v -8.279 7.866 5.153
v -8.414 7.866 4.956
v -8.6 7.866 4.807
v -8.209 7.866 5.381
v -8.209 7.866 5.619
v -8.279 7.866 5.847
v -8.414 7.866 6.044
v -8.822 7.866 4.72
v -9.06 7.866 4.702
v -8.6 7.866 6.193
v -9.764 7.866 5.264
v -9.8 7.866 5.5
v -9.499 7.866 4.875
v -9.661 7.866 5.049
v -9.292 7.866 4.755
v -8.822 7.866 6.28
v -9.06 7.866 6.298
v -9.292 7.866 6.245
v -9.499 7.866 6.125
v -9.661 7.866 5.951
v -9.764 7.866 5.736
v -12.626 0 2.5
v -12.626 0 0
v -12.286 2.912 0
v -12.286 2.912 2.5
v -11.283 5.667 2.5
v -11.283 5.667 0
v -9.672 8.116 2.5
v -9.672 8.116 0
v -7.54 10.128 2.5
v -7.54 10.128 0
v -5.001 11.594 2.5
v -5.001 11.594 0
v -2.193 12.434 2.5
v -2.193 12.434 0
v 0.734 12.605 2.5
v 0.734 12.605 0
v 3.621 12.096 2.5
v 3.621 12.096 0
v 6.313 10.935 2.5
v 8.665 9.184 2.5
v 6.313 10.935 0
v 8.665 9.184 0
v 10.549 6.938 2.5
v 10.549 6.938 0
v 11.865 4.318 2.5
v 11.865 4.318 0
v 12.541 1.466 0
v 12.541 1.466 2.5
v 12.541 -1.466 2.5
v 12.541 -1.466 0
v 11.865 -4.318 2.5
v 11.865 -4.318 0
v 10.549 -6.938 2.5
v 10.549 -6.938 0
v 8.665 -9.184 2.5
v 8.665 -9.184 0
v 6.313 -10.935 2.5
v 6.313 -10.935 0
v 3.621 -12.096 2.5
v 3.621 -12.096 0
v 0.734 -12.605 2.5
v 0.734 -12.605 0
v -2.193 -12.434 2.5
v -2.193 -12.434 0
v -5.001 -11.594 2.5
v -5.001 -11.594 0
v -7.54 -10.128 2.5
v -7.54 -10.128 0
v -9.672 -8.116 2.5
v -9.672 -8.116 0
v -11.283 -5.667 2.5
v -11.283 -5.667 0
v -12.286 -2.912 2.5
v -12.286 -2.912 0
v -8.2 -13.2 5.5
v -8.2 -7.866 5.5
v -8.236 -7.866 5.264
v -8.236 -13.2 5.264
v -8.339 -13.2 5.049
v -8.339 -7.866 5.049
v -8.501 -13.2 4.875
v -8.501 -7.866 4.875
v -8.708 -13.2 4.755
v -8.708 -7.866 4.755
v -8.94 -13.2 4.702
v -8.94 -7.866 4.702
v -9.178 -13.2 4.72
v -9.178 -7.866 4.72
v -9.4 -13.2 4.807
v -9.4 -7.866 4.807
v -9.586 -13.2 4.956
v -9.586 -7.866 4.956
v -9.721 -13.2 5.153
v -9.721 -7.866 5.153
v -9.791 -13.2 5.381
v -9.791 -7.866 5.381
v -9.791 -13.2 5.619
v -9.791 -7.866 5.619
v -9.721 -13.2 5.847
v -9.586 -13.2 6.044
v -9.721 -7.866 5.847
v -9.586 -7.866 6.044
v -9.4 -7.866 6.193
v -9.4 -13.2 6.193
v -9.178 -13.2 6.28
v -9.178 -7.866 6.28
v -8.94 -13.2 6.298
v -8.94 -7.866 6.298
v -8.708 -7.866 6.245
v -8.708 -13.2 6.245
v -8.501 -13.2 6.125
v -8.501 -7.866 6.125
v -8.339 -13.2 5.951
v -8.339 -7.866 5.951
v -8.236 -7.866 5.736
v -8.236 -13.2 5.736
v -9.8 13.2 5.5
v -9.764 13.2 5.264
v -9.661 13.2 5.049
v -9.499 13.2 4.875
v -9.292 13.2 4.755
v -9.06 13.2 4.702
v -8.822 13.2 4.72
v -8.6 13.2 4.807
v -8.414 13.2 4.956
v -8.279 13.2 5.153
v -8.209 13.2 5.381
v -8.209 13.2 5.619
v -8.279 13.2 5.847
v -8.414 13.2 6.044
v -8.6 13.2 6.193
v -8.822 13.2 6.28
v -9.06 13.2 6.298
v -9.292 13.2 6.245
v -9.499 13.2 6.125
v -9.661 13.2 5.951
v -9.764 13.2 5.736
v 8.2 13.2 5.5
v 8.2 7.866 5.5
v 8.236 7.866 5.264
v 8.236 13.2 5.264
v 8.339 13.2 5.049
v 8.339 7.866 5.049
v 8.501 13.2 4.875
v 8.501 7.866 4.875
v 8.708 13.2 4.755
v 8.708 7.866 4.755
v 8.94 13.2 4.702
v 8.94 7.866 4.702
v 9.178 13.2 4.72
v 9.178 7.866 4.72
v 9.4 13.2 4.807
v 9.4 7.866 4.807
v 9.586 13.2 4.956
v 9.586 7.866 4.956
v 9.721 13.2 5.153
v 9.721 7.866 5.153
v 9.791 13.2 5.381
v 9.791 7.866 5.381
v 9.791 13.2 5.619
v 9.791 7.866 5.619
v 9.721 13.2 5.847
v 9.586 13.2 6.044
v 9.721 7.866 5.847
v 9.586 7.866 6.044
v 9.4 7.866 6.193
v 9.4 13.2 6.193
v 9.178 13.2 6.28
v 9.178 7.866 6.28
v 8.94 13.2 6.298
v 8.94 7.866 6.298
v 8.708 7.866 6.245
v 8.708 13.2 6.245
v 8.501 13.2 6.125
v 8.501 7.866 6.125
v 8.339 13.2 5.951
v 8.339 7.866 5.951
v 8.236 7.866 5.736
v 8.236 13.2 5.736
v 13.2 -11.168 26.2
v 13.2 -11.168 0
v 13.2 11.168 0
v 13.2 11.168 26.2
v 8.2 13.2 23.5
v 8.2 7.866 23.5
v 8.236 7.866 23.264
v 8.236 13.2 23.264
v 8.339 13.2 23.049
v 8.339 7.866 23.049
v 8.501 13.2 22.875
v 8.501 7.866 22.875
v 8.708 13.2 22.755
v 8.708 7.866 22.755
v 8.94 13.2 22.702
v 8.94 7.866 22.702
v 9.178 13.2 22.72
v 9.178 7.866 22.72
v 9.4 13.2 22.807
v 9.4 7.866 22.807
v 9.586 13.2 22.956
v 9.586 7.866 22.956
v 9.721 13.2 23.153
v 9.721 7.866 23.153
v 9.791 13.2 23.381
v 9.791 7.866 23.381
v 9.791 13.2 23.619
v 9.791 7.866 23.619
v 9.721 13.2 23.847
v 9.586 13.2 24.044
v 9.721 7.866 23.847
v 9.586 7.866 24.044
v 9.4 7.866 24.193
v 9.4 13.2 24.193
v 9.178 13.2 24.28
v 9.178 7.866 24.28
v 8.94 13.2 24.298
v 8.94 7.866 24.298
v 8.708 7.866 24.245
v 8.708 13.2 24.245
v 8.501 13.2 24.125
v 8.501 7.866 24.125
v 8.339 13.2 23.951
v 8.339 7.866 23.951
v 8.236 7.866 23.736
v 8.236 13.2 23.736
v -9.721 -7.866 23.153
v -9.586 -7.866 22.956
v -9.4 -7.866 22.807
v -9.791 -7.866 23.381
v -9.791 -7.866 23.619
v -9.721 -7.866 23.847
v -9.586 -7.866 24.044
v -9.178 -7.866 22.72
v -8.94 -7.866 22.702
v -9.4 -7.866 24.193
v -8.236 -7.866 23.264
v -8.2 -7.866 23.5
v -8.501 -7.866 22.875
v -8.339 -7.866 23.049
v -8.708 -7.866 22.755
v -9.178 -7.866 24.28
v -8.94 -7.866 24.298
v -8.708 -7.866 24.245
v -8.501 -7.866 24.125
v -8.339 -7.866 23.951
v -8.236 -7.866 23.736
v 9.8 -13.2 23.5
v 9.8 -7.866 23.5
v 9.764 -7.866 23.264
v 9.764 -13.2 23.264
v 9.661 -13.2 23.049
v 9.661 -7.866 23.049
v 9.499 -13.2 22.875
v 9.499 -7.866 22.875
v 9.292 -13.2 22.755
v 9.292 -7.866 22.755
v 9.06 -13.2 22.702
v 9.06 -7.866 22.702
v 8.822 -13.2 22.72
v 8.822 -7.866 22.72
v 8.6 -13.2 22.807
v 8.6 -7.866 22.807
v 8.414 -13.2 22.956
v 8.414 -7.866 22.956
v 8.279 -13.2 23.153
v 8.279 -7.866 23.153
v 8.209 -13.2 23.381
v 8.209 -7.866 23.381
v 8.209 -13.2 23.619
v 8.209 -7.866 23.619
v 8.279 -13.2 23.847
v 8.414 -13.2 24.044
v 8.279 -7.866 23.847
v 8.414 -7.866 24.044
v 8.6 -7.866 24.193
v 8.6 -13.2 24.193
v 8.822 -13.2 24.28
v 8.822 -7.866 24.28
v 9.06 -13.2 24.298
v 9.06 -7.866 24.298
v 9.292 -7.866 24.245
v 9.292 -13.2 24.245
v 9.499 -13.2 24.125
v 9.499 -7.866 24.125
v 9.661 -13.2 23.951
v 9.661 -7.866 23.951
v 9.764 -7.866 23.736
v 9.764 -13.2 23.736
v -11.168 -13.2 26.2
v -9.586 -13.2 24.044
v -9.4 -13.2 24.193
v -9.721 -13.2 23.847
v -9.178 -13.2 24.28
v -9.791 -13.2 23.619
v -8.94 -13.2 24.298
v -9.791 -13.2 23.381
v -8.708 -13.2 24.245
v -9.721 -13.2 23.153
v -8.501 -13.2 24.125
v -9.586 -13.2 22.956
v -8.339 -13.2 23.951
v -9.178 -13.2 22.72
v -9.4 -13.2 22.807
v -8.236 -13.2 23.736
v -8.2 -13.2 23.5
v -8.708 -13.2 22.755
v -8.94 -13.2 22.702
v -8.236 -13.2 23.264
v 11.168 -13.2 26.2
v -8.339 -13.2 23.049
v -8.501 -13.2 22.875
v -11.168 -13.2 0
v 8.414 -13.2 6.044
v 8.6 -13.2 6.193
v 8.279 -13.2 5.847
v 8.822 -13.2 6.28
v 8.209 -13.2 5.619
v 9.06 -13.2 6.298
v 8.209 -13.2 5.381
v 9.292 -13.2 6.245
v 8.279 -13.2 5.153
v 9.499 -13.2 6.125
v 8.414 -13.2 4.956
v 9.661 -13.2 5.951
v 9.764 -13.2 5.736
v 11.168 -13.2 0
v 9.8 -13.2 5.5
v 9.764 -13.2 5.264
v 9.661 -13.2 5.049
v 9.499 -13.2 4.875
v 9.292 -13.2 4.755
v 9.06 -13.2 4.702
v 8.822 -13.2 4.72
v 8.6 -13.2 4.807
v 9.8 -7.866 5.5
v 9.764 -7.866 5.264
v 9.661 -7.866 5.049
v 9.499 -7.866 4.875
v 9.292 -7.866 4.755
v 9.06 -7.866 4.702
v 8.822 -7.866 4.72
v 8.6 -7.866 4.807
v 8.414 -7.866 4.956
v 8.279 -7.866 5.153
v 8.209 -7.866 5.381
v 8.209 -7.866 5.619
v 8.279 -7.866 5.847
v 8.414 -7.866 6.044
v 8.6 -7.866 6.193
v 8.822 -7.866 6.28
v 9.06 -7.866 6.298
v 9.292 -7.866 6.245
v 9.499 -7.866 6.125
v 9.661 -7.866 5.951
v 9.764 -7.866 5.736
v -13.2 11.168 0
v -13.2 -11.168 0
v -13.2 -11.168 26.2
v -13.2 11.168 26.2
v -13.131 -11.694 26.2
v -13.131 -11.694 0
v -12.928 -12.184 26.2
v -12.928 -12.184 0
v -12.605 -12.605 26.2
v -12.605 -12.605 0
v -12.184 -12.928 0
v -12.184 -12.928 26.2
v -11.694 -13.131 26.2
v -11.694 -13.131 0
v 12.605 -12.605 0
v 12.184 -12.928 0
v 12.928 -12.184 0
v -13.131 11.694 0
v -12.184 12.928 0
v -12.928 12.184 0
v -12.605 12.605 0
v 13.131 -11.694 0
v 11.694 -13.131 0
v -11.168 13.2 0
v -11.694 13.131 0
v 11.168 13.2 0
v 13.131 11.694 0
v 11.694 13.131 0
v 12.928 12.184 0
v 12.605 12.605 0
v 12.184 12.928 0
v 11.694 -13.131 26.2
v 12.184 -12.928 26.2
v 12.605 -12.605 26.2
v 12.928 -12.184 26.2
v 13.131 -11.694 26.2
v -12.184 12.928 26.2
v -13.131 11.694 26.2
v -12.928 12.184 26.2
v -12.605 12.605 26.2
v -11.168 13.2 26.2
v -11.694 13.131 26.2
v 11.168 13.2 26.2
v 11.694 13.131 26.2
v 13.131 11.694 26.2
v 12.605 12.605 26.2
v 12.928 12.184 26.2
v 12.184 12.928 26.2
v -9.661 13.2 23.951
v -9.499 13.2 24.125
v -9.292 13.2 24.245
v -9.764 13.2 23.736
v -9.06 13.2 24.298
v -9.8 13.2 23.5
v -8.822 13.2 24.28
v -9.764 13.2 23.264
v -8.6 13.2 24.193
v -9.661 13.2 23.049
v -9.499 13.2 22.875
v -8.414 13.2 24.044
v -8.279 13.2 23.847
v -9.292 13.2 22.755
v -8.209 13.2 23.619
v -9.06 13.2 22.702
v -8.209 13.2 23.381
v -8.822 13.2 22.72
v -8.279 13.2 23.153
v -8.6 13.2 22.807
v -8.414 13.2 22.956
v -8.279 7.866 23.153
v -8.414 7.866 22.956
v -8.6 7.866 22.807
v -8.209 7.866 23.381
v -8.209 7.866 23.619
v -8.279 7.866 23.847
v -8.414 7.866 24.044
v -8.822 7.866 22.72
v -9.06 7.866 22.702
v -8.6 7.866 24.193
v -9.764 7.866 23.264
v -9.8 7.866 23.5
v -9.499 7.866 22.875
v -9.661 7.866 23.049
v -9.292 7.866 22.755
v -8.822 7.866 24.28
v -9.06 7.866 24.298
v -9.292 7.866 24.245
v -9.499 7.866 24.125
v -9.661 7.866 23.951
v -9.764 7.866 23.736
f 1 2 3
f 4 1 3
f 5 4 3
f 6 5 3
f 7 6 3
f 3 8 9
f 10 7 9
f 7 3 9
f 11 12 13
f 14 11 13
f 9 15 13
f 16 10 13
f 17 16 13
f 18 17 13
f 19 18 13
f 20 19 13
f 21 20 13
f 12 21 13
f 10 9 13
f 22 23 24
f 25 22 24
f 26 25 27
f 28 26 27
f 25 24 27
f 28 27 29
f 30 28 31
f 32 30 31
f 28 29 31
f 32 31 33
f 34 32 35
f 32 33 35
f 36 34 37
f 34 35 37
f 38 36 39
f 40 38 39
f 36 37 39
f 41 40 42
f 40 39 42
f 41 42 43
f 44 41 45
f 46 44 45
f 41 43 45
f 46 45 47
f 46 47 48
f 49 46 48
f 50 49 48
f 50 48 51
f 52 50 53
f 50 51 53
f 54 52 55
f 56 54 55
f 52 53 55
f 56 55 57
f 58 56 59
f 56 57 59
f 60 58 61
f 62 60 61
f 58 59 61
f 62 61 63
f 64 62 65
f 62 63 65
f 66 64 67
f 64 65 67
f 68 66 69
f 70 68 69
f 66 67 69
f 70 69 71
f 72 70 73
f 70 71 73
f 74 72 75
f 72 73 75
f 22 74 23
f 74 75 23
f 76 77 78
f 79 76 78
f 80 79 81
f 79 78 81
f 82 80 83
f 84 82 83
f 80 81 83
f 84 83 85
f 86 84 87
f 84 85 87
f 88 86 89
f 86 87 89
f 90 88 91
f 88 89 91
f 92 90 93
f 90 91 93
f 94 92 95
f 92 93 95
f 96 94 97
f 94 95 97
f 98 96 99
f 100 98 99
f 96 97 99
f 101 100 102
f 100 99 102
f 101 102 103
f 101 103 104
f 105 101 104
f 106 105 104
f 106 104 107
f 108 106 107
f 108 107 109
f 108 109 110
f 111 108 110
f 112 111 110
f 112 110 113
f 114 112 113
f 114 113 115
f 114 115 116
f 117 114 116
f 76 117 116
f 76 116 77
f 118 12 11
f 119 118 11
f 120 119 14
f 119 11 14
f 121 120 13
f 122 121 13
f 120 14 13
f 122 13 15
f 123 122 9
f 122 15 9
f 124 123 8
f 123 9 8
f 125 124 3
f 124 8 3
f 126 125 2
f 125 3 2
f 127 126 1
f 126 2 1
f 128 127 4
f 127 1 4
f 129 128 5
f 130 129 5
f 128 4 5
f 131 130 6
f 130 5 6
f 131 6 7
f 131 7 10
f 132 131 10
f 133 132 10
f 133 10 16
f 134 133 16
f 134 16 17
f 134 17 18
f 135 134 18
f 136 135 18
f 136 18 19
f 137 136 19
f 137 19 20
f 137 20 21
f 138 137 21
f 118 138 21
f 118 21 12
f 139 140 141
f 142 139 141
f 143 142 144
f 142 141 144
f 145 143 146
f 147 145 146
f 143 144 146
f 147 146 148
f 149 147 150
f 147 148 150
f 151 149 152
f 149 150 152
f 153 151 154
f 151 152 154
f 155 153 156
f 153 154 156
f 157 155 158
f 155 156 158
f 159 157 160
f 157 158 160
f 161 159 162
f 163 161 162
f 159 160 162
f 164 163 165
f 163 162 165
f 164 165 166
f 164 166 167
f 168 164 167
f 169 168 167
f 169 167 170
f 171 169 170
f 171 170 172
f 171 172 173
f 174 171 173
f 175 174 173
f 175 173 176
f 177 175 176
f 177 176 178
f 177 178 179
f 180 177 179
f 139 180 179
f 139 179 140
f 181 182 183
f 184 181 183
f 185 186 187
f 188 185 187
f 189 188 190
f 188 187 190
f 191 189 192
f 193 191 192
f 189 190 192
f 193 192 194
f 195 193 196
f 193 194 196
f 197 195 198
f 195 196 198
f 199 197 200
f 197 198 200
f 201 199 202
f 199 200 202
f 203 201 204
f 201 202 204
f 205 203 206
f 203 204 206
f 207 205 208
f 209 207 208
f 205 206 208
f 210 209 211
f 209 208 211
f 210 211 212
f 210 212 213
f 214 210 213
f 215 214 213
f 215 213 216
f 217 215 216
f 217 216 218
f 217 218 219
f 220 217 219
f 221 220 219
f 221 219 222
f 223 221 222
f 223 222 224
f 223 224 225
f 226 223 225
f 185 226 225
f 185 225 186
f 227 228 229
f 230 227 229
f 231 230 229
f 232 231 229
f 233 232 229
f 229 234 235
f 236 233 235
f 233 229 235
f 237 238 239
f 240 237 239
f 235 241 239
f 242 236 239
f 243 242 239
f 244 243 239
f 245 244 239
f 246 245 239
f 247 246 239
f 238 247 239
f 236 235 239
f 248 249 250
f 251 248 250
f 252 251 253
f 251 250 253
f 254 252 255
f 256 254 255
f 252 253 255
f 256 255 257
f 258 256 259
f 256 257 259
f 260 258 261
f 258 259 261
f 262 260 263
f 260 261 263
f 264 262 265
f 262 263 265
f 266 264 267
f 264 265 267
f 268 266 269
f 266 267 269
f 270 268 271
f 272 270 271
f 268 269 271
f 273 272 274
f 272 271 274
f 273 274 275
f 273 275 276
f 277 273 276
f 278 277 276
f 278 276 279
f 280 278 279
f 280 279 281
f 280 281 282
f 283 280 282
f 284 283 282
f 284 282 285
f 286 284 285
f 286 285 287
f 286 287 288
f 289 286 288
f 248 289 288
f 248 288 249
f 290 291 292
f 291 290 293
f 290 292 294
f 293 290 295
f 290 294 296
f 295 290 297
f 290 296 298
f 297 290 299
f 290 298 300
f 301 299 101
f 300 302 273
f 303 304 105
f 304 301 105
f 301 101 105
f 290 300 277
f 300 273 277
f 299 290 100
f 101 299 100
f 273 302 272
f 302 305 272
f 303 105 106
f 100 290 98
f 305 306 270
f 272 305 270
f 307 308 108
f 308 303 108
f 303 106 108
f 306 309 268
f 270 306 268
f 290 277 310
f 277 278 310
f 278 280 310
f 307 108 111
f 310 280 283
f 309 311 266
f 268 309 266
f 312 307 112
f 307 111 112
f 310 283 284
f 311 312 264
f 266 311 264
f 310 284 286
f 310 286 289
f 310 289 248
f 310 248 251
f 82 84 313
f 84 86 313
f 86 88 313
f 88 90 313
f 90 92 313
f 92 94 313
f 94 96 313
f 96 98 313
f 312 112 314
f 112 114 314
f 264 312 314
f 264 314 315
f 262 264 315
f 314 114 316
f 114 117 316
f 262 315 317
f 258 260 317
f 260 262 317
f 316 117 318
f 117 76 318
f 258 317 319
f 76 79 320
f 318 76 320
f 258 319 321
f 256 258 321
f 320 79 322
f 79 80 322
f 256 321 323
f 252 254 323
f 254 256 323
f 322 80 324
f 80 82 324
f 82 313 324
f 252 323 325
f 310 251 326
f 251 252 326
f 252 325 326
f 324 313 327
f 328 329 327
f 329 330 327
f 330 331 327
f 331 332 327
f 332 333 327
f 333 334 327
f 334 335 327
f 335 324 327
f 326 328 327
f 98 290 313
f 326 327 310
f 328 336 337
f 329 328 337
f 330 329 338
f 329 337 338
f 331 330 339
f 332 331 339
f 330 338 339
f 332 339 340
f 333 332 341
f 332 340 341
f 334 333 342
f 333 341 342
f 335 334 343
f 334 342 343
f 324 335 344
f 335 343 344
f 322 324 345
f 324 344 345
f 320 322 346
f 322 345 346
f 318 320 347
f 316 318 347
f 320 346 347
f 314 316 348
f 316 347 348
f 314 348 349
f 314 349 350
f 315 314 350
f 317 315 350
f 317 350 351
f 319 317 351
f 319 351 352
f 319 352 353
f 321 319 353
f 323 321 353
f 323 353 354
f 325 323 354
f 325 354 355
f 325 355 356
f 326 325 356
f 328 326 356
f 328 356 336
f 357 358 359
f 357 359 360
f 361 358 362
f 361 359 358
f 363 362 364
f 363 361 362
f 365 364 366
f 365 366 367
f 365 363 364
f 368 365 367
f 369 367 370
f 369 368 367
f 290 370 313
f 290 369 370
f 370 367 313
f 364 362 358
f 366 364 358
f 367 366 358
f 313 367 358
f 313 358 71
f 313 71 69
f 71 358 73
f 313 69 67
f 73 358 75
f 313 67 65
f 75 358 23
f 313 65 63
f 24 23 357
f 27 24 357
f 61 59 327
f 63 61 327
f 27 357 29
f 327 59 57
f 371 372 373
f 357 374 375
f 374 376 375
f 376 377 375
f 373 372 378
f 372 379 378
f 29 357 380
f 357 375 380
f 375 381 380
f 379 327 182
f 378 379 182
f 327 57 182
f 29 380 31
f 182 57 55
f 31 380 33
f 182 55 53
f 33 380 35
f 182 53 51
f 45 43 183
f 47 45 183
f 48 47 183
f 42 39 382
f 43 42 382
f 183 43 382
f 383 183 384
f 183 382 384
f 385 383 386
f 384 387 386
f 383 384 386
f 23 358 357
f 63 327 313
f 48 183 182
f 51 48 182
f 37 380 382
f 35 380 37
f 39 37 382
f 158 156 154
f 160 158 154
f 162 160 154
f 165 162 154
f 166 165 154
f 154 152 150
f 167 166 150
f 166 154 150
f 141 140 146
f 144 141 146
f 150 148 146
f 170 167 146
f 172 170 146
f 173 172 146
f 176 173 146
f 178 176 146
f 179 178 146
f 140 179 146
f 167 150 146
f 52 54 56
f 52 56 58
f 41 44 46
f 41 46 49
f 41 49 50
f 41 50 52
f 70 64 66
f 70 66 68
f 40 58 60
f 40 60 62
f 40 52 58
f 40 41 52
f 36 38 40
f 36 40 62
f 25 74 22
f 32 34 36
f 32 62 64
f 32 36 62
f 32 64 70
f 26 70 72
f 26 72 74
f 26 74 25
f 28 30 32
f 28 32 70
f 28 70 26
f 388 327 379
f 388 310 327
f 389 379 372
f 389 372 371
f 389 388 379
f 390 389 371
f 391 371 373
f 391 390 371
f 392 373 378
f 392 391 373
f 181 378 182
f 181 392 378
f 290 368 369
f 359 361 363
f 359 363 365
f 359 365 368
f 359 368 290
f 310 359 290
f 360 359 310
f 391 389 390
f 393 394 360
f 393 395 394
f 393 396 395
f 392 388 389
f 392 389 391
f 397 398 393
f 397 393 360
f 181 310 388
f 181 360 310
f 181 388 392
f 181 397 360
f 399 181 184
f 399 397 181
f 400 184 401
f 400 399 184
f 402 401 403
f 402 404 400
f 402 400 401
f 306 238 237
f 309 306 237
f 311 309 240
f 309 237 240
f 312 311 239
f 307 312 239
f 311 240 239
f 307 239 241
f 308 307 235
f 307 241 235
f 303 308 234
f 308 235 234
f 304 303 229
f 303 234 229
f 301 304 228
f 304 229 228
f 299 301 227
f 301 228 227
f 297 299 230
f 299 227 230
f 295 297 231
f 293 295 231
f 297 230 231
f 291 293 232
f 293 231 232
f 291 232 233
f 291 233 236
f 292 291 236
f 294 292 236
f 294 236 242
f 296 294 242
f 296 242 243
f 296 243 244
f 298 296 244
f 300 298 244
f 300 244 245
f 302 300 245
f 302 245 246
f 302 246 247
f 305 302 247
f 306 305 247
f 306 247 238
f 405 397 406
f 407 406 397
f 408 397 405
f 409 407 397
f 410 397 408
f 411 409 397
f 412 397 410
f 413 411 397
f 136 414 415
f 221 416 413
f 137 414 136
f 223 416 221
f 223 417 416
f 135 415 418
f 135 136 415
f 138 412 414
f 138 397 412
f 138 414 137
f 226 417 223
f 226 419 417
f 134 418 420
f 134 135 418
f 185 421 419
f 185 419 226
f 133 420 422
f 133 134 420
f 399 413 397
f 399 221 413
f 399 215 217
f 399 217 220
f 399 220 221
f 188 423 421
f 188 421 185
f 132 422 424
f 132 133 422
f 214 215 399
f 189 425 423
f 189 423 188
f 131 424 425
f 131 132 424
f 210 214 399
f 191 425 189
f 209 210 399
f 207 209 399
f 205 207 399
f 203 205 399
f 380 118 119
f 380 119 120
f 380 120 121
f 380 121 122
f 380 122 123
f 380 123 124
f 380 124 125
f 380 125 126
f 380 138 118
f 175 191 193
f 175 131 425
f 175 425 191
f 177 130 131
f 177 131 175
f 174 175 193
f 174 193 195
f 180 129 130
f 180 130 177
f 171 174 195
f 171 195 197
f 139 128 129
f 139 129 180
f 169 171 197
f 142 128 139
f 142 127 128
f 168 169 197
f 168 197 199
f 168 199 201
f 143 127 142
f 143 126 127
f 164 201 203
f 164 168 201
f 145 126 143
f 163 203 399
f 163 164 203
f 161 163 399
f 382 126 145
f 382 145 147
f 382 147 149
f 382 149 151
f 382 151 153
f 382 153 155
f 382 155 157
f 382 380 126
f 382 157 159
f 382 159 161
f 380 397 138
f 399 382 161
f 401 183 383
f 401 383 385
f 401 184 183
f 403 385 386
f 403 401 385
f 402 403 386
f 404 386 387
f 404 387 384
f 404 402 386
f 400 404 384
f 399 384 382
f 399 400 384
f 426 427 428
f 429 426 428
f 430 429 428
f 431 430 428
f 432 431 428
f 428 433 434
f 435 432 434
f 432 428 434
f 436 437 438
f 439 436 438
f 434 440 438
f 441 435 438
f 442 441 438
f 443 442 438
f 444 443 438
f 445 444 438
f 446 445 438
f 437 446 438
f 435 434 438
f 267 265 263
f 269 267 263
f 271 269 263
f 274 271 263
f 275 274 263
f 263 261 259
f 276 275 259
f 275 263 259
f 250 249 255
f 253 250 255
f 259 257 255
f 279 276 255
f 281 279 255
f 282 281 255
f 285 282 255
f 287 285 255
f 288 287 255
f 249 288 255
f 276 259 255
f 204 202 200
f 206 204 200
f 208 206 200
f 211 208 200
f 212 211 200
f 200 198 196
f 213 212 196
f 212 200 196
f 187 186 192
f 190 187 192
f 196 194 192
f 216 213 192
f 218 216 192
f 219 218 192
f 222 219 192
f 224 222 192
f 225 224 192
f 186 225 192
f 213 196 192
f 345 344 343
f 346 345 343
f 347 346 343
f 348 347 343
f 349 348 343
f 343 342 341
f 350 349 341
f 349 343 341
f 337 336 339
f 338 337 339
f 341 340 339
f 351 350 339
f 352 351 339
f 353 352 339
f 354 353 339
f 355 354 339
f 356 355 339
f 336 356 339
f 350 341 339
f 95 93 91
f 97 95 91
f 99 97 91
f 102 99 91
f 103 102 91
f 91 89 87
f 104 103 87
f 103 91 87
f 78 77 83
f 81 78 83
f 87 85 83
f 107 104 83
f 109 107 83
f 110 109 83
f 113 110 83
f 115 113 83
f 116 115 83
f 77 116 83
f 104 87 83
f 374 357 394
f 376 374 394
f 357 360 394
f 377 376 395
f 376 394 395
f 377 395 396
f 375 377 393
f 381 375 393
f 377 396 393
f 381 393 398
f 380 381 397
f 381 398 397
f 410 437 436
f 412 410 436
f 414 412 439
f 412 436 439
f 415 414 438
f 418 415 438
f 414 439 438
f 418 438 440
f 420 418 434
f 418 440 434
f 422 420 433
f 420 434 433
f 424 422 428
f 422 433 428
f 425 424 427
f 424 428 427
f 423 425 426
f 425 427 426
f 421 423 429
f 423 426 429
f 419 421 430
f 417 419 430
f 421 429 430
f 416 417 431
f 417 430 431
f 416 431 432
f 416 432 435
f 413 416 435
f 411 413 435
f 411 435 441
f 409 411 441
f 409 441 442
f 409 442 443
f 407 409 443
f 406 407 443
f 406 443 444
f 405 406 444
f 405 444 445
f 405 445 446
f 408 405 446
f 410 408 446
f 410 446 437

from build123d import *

# Parameters (mm, degrees)
SKETCH1_W                 = 26.4
SKETCH1_H                 = 26.4
BOSS_EXTRUDE1_DEPTH       = 26.2
FILLET1_R                 = 2.032
SKETCH5_R                 = 12.626192159
CUT_EXTRUDE3_DEPTH        = 2.5
M2X0_4_TAPPED_HOLE1_D     = 1.6
M2X0_4_TAPPED_HOLE1_DEPTH = 5.334
M2X0_4_TAPPED_HOLE2_D     = 1.6
M2X0_4_TAPPED_HOLE2_DEPTH = 5.334


with BuildPart() as part:
    # Sketch1 → Boss-Extrude1 (new body)
    with BuildSketch(Plane.XY):
        Rectangle(SKETCH1_W, SKETCH1_H)
    extrude(amount=BOSS_EXTRUDE1_DEPTH)

    # Fillet1
    fillet1_edges = [part.edges().sort_by_distance(p)[0] for p in [
        (-13.2, 13.2, 13.1),
        (13.2, 13.2, 13.1),
        (13.2, -13.2, 13.1),
        (-13.2, -13.2, 13.1),
    ]]
    fillet(fillet1_edges, radius=FILLET1_R)

    # Sketch5 → Cut-Extrude3 (cut)
    with BuildSketch(Plane(origin=(0, 0, 0), x_dir=(-1, 0, 0), z_dir=(0, 0, -1))):
        Circle(SKETCH5_R)
    extrude(amount=-CUT_EXTRUDE3_DEPTH, mode=Mode.SUBTRACT)

    # M2x0.4 Tapped Hole1
    with Locations(Plane(origin=(0, -13.2, 0), x_dir=(-1, 0, 0), z_dir=(0, -1, 0))):
        with Locations((9, -23.5), (9, -5.5), (-9, -5.5), (-9, -23.5)):
            Hole(M2X0_4_TAPPED_HOLE1_D / 2, depth=M2X0_4_TAPPED_HOLE1_DEPTH)

    # M2x0.4 Tapped Hole2
    with Locations(Plane(origin=(0, 13.2, 0), x_dir=(1, 0, 0), z_dir=(0, 1, 0))):
        with Locations((9, -5.5), (9, -23.5), (-9, -23.5), (-9, -5.5)):
            Hole(M2X0_4_TAPPED_HOLE2_D / 2, depth=M2X0_4_TAPPED_HOLE2_DEPTH)


solid = part.part
